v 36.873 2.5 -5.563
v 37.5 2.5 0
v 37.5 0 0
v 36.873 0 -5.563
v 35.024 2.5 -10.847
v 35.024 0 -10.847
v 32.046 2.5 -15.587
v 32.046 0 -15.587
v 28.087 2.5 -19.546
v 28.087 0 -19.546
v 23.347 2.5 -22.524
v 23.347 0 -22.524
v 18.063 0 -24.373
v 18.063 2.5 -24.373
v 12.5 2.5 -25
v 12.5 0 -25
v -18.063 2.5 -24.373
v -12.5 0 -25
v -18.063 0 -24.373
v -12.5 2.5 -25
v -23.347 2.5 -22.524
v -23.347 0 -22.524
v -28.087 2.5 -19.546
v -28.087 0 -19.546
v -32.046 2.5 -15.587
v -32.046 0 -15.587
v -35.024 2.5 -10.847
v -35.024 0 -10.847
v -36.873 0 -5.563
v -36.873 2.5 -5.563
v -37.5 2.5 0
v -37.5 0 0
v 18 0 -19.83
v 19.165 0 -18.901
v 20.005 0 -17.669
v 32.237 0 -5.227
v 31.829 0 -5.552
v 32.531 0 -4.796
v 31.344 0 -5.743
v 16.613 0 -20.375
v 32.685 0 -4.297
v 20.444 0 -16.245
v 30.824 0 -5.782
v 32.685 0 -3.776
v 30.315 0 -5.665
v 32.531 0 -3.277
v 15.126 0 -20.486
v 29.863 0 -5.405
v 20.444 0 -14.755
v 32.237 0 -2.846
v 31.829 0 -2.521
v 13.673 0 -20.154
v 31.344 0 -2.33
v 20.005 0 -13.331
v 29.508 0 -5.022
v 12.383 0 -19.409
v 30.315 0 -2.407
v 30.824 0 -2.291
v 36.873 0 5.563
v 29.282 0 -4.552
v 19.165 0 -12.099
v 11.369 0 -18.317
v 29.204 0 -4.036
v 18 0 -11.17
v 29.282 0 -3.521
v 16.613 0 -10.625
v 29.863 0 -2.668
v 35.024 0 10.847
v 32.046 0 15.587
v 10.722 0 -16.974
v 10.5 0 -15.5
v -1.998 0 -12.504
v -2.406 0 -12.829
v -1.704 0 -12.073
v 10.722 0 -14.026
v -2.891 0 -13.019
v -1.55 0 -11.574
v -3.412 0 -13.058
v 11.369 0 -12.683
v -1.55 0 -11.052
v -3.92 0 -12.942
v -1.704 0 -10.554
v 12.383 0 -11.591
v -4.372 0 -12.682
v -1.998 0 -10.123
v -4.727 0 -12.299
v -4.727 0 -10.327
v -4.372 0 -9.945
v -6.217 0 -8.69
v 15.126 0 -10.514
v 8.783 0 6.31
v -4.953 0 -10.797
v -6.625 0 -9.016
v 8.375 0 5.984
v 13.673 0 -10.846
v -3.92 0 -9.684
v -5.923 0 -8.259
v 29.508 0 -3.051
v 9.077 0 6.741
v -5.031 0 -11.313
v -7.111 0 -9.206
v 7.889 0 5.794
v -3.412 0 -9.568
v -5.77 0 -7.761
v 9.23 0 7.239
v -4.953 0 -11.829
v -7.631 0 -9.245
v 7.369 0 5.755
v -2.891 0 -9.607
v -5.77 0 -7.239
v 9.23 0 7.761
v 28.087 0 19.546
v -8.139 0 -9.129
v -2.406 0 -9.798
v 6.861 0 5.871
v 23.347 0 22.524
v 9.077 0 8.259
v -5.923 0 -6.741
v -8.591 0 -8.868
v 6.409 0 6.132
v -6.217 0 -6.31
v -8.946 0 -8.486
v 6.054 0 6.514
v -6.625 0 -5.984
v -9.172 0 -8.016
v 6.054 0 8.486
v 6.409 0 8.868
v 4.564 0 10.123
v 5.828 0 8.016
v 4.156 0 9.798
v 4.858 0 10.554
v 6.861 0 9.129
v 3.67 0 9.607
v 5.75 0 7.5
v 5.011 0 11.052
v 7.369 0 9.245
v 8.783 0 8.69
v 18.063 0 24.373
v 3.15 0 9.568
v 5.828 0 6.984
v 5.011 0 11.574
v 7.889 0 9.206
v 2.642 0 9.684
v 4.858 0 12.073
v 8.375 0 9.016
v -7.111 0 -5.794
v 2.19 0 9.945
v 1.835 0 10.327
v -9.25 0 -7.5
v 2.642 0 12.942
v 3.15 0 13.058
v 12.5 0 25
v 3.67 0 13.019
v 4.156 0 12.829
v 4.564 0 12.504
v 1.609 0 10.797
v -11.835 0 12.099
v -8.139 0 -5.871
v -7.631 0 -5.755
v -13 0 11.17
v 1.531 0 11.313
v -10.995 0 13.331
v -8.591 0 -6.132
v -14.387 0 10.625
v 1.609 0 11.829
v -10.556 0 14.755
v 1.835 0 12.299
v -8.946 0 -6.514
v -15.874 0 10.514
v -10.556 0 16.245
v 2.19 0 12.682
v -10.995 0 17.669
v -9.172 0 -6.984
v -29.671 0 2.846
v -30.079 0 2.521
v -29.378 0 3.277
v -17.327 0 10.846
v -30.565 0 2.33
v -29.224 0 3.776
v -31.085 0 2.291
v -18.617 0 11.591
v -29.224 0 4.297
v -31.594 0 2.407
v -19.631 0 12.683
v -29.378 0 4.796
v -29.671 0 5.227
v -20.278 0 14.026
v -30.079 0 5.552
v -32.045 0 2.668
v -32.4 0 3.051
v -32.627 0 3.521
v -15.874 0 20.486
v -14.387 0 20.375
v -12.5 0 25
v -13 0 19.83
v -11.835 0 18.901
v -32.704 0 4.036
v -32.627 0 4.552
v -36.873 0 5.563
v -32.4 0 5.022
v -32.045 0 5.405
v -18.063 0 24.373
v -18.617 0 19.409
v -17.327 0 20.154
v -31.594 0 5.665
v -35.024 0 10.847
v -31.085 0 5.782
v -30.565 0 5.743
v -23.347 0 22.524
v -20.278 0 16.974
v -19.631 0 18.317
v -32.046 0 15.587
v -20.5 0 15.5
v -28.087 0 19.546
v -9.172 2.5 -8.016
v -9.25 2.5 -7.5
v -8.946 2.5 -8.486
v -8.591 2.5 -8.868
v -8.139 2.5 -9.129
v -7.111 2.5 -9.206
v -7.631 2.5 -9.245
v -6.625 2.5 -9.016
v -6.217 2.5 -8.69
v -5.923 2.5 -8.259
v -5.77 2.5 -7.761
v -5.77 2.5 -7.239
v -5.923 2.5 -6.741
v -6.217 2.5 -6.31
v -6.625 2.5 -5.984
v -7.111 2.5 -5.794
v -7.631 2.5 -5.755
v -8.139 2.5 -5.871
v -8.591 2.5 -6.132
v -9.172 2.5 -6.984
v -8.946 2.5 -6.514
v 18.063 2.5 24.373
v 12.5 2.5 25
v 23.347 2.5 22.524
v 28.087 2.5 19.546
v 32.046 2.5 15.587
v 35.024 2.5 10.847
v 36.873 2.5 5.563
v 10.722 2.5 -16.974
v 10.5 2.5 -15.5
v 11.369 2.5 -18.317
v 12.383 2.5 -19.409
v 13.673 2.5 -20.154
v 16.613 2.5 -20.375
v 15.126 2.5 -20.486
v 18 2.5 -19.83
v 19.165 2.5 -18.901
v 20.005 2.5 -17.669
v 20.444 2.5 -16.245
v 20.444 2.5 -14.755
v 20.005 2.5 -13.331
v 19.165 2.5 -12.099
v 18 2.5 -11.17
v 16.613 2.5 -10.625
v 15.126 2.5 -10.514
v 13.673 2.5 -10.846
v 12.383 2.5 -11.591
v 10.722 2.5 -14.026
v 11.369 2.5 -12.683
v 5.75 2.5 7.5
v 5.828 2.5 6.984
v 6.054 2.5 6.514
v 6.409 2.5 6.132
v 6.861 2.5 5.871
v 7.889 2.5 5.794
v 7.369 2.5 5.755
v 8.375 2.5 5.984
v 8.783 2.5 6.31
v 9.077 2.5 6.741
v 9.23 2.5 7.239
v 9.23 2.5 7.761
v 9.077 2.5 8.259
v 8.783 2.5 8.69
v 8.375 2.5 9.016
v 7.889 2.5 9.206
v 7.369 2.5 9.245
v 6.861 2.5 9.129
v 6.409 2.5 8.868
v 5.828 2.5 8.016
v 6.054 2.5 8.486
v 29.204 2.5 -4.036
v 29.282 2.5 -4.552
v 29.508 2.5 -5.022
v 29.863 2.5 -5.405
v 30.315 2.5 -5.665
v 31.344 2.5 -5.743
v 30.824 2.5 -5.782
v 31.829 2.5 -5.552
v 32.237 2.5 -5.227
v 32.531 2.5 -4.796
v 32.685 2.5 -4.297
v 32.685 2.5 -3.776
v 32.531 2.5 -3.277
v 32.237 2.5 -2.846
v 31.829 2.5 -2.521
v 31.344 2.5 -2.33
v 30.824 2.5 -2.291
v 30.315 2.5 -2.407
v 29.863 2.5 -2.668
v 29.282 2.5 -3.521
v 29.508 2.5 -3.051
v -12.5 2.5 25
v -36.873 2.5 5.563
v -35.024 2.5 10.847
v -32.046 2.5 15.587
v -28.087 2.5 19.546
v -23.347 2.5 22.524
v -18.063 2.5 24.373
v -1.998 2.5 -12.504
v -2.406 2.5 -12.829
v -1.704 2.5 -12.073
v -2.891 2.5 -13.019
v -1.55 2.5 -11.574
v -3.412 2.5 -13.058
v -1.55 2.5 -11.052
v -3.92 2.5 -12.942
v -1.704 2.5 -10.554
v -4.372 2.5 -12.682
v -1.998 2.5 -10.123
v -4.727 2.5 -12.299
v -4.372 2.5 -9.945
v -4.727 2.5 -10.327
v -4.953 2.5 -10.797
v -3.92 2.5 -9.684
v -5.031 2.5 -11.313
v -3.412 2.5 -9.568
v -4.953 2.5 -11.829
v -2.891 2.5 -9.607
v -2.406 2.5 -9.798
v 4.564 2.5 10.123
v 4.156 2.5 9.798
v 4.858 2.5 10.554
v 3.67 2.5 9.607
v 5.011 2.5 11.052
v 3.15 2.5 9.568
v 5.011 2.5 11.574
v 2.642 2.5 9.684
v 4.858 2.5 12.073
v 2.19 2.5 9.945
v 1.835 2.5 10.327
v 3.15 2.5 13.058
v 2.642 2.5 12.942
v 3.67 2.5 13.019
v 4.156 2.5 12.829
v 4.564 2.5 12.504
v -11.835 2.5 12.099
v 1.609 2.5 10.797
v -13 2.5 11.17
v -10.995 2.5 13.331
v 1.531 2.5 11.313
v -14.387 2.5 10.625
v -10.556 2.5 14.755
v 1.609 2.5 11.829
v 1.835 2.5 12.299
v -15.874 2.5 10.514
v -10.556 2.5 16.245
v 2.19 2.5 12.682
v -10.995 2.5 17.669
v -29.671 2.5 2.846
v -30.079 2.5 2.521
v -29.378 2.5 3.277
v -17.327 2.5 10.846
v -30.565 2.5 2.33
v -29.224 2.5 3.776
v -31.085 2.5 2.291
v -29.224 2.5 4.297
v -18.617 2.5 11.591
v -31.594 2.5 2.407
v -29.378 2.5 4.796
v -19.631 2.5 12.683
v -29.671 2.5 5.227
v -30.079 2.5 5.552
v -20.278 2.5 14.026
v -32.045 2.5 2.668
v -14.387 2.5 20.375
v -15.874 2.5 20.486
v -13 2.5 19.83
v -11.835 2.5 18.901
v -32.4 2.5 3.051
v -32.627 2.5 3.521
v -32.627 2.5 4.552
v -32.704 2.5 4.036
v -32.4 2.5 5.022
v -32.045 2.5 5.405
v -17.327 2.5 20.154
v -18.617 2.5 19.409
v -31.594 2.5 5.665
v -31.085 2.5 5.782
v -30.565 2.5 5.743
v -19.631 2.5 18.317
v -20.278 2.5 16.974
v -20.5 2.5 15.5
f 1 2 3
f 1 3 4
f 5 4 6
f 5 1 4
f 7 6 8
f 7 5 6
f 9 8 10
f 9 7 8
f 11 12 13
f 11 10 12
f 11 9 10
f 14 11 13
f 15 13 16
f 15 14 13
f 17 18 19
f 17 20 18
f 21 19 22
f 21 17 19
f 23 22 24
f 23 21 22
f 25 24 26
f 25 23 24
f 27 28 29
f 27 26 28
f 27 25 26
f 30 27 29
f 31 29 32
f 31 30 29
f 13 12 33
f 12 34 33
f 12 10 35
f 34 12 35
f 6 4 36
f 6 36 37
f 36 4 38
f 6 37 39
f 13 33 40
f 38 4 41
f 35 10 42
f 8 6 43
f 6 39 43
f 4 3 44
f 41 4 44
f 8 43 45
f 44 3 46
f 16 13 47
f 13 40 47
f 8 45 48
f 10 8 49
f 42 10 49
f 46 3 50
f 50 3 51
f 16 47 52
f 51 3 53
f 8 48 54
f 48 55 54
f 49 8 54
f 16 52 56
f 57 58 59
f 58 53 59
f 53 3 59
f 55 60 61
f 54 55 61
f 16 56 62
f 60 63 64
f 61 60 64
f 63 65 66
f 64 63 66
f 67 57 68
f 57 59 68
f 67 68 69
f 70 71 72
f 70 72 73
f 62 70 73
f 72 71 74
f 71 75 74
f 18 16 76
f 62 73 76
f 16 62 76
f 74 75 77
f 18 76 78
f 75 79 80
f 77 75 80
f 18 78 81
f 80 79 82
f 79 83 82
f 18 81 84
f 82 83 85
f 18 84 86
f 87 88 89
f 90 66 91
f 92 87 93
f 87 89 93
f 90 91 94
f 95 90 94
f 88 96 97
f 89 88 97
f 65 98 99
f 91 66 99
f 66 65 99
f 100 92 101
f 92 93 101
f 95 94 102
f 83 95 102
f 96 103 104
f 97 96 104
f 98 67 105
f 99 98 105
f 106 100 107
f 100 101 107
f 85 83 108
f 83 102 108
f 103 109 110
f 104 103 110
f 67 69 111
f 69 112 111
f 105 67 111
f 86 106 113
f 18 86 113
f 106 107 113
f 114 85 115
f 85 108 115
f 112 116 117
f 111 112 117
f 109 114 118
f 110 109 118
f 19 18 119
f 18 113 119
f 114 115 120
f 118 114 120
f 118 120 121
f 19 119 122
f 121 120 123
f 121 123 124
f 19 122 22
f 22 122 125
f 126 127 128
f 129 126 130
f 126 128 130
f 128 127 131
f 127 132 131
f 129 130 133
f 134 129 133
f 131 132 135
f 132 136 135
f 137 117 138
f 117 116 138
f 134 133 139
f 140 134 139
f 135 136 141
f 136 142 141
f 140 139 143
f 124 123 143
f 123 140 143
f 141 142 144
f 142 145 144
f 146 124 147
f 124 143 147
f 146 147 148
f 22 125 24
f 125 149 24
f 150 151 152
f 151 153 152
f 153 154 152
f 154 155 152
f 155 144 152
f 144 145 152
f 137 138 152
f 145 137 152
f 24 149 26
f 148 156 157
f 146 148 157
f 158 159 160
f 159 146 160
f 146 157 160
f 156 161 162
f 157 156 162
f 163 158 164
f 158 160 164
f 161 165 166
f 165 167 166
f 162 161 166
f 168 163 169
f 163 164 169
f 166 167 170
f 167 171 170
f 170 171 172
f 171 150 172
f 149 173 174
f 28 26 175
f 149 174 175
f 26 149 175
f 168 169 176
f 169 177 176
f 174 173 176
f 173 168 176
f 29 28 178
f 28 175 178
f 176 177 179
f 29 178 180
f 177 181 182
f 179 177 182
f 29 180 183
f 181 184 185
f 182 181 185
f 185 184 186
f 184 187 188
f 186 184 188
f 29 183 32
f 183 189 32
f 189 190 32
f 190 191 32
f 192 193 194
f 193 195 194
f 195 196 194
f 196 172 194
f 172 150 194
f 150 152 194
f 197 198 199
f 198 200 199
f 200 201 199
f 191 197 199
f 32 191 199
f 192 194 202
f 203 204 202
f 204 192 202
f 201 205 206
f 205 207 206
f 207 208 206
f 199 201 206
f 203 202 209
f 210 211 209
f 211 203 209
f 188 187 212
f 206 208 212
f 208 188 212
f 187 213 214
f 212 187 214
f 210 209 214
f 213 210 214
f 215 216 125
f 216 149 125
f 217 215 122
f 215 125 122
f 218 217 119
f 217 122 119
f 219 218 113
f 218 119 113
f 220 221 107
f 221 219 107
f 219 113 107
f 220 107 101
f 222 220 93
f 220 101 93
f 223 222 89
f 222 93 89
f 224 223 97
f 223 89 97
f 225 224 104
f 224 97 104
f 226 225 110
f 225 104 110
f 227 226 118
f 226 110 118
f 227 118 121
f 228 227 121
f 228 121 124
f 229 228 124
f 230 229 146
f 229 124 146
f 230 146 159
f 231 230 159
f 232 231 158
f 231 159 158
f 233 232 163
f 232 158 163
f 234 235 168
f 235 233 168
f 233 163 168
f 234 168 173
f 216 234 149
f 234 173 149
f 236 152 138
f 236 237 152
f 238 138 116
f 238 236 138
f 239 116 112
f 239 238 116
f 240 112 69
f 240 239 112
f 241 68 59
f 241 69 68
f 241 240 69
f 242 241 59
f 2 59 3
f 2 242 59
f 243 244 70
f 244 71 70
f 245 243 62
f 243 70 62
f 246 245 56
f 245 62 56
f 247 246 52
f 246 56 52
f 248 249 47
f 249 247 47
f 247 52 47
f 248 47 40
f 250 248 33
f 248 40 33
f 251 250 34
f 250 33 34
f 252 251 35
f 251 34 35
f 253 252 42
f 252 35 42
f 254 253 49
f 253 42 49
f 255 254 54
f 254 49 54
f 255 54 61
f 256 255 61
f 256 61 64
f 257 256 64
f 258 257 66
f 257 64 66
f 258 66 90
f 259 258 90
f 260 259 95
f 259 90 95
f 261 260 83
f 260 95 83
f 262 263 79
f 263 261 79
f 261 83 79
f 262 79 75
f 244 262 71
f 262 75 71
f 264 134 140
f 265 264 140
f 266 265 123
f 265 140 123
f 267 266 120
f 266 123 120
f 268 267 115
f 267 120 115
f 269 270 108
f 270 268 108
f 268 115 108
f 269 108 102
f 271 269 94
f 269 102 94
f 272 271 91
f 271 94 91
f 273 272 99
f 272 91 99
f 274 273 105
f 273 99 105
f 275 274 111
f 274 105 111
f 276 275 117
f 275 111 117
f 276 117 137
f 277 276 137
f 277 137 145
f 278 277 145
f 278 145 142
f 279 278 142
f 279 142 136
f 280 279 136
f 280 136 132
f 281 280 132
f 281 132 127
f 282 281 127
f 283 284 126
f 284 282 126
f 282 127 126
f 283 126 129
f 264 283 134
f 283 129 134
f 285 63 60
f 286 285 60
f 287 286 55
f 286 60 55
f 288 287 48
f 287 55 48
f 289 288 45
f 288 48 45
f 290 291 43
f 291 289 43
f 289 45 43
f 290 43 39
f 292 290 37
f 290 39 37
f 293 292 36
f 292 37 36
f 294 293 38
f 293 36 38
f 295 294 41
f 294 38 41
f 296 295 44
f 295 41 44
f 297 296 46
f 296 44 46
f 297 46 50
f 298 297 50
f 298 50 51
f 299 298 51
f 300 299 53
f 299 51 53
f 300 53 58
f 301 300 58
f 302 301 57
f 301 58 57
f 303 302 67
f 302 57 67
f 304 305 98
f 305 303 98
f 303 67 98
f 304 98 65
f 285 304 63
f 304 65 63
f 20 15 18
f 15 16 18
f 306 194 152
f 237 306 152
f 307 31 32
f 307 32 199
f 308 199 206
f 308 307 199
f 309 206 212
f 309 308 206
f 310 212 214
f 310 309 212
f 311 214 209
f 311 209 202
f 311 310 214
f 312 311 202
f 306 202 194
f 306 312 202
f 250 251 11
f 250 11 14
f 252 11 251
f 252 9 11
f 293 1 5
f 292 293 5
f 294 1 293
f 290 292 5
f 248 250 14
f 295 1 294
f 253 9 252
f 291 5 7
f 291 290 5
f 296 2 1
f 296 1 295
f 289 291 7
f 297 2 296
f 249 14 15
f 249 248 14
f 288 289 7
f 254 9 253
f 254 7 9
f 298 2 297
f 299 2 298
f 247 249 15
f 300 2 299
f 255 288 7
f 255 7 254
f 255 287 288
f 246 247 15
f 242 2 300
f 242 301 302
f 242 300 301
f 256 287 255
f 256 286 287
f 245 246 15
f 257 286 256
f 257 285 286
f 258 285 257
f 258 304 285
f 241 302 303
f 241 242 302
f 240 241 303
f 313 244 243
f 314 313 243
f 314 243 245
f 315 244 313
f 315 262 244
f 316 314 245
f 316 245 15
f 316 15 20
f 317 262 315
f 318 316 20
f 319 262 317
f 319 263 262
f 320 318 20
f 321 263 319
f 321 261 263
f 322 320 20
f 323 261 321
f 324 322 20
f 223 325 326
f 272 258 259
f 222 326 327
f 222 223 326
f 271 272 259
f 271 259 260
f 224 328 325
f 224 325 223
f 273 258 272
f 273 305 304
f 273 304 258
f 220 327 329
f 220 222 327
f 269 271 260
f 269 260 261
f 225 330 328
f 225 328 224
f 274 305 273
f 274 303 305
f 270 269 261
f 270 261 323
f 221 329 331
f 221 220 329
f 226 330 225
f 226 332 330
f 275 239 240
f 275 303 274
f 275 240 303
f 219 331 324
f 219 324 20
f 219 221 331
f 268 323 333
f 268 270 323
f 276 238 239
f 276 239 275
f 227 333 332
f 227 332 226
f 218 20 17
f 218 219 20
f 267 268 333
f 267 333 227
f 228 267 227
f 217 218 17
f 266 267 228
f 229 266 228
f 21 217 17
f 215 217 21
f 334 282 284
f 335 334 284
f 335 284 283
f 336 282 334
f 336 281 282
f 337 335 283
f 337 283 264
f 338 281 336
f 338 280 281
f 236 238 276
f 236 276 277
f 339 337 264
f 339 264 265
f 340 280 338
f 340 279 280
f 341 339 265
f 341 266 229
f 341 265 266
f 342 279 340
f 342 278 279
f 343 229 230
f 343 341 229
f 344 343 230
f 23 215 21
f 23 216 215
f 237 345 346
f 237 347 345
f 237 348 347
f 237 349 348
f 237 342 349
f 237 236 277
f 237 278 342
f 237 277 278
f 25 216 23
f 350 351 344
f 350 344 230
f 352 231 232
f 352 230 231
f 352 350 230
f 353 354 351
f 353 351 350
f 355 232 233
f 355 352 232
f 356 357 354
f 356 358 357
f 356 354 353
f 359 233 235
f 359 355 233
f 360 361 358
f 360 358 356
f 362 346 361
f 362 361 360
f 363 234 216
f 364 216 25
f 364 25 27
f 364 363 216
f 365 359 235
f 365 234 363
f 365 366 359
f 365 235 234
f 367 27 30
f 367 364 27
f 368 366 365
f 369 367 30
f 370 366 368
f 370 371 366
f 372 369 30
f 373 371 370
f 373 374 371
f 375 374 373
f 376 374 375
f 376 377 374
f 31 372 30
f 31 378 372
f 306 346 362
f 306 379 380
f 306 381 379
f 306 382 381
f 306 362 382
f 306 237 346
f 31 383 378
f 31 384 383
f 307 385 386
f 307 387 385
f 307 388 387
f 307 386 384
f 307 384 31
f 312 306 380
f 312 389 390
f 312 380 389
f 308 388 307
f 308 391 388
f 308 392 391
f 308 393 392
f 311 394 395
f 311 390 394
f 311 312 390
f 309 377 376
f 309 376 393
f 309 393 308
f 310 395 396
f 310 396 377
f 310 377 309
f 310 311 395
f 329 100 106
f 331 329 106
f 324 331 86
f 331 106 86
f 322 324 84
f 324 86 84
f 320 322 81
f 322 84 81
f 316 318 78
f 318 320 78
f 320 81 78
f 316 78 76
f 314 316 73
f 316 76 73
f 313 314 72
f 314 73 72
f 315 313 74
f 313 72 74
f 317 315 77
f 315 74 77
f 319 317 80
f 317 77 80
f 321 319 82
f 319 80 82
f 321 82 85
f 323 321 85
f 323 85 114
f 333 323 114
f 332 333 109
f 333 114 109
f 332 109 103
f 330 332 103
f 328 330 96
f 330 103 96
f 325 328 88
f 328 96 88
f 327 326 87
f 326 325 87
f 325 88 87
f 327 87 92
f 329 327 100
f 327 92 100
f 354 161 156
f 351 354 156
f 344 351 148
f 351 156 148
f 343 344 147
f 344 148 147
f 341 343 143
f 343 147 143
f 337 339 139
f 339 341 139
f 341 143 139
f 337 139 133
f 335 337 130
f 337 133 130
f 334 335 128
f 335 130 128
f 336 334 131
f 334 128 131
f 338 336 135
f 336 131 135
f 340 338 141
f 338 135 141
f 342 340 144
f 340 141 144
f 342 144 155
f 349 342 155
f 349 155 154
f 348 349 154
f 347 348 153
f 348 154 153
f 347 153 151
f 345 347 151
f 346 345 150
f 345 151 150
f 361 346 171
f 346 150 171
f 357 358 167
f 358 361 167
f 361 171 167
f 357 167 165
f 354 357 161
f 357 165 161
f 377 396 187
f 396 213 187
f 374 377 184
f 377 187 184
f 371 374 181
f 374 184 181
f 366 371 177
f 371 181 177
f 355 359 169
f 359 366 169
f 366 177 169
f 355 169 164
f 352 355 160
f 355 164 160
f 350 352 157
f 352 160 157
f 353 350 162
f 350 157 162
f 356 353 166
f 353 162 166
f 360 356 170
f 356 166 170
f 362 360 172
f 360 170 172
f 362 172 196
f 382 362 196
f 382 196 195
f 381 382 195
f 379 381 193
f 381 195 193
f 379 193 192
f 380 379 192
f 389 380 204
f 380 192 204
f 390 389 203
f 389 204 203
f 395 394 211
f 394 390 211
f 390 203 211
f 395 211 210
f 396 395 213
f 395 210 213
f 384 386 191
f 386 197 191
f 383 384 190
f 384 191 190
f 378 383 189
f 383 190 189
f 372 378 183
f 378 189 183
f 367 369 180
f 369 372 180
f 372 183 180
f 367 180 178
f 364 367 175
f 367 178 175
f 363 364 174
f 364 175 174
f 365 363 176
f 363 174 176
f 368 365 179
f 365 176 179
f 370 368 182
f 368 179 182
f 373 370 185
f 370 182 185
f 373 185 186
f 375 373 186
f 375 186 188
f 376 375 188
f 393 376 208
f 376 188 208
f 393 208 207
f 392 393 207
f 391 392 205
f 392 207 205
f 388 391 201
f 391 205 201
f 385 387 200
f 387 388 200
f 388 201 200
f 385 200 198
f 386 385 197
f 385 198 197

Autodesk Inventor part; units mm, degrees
ref_plane "YZ Plane" through (0, 0, 0) normal (1, 0, 0) x (0, 1, 0)
ref_plane "XZ Plane" through (0, 0, 0) normal (0, 1, 0) x (-1, 0, 0)
ref_plane "XY Plane" through (0, 0, 0) normal (0, 0, 1) x (1, 0, 0)
sketch "Sketch1" plane through (0, 0, 0) normal (0, 1, 0) x (-1, 0, 0)
  line L0 (37.5, 25) -> (-37.5, 25)
  line L1 (-37.5, 25) -> (-37.5, -25)
  line L2 (-37.5, -25) -> (37.5, -25)
  line L3 (37.5, -25) -> (37.5, 25)
  circle A0 centre (-7.5, 7.5) radius 1.75
  circle A1 centre (7.5, -7.5) radius 1.75
  line L4 (-7.5, 7.5) -> (7.5, -7.5) construction
  circle A2 centre (15.5, 15.5) radius 5
  line L5 (15.5, 15.5) -> (-15.5, -15.5) construction
  circle A3 centre (-15.5, -15.5) radius 5
  line L6 (15.5, 15.5) -> (13.8367, 7.6748) construction
  line L7 (30.9543, 4.0364) -> (-3.2809, 11.3133) construction
  circle A4 centre (13.8367, 7.6748) radius 14 construction
  line L8 (18.715, -5.4478) -> (4.0428, -2.3291) construction
  line L9 (4.0428, -2.3291) -> (2.9037, -7.6878) construction
  line L10 (2.9037, -7.6878) -> (17.5759, -10.8065) construction
  line L11 (17.5759, -10.8065) -> (18.715, -5.4478) construction
  circle A5 centre (-3.2809, 11.3133) radius 1.75
  circle A6 centre (30.9543, 4.0364) radius 1.75
  line L12 (3.2809, -11.3133) -> (-30.9543, -4.0364) construction
  line L13 (-13.8367, -7.6748) -> (-15.5, -15.5) construction
  circle A7 centre (3.2809, -11.3133) radius 1.75
  circle A8 centre (-30.9543, -4.0364) radius 1.75
  circle A9 centre (-13.8367, -7.6748) radius 14 construction
  line L14 (-4.0428, 2.3291) -> (-18.715, 5.4478) construction
  line L15 (-18.715, 5.4478) -> (-17.5759, 10.8065) construction
  line L16 (-17.5759, 10.8065) -> (-2.9037, 7.6878) construction
  line L17 (-2.9037, 7.6878) -> (-4.0428, 2.3291) construction
  point P0 (0, 0)
  point P1 (0, 0)
  point P2 (0, 25)
  point P3 (-37.5, 0)
  dimension "d0" = 7.5
  dimension "d1" = 7.5
  dimension "d4" = 3.5
  dimension "d6" = 10
  dimension "d7" = 15.5
  dimension "d8" = 15.5
  dimension "d9" = 8
  dimension "d10" = 35
  dimension "d11" = 28
  dimension "d12" = 3.3
  dimension "d13" = 15
  dimension "d14" = 12
  dimension "d15" = 75
  dimension "d16" = 50
extrude "Extrusion1" add sketch "Sketch1" along normal blind 2.5
fillet "Fillet1" radius 25 4 edges at (-37.5, 1.25, 25) (37.5, 1.25, 25) (37.5, 1.25, -25) (-37.5, 1.25, -25)
equation "\"d1\" = d0"
equation "\"d8\" = d7"
equation "\"thumbscrew_dia\" = 15.8"
equation "\"helix_length\" = 3.5"
equation "\"helix_width\" = 2"
equation "\"helix_fillet\" = 0.3"
equation "\"helix_inner_dia\" = 19"
equation "\"helix_outer_dia\" = 23"
equation "\"elephant_prevention_radius\" = 0.3"
equation "\"gear_center_distance\" = 25"
equation "\"stepper_screw_dist\" = 35"
equation "\"stepper_axis_offset\" = 8"
equation "\"mount_screw_ortho_dist\" = 31"
equation "\"stepper_dia\" = 28"
equation "\"sheet_thick\" = 2.5"
equation "\"helix_winding_factor\" = 1.2"
properties part number "mount-plate_3DPrint"
